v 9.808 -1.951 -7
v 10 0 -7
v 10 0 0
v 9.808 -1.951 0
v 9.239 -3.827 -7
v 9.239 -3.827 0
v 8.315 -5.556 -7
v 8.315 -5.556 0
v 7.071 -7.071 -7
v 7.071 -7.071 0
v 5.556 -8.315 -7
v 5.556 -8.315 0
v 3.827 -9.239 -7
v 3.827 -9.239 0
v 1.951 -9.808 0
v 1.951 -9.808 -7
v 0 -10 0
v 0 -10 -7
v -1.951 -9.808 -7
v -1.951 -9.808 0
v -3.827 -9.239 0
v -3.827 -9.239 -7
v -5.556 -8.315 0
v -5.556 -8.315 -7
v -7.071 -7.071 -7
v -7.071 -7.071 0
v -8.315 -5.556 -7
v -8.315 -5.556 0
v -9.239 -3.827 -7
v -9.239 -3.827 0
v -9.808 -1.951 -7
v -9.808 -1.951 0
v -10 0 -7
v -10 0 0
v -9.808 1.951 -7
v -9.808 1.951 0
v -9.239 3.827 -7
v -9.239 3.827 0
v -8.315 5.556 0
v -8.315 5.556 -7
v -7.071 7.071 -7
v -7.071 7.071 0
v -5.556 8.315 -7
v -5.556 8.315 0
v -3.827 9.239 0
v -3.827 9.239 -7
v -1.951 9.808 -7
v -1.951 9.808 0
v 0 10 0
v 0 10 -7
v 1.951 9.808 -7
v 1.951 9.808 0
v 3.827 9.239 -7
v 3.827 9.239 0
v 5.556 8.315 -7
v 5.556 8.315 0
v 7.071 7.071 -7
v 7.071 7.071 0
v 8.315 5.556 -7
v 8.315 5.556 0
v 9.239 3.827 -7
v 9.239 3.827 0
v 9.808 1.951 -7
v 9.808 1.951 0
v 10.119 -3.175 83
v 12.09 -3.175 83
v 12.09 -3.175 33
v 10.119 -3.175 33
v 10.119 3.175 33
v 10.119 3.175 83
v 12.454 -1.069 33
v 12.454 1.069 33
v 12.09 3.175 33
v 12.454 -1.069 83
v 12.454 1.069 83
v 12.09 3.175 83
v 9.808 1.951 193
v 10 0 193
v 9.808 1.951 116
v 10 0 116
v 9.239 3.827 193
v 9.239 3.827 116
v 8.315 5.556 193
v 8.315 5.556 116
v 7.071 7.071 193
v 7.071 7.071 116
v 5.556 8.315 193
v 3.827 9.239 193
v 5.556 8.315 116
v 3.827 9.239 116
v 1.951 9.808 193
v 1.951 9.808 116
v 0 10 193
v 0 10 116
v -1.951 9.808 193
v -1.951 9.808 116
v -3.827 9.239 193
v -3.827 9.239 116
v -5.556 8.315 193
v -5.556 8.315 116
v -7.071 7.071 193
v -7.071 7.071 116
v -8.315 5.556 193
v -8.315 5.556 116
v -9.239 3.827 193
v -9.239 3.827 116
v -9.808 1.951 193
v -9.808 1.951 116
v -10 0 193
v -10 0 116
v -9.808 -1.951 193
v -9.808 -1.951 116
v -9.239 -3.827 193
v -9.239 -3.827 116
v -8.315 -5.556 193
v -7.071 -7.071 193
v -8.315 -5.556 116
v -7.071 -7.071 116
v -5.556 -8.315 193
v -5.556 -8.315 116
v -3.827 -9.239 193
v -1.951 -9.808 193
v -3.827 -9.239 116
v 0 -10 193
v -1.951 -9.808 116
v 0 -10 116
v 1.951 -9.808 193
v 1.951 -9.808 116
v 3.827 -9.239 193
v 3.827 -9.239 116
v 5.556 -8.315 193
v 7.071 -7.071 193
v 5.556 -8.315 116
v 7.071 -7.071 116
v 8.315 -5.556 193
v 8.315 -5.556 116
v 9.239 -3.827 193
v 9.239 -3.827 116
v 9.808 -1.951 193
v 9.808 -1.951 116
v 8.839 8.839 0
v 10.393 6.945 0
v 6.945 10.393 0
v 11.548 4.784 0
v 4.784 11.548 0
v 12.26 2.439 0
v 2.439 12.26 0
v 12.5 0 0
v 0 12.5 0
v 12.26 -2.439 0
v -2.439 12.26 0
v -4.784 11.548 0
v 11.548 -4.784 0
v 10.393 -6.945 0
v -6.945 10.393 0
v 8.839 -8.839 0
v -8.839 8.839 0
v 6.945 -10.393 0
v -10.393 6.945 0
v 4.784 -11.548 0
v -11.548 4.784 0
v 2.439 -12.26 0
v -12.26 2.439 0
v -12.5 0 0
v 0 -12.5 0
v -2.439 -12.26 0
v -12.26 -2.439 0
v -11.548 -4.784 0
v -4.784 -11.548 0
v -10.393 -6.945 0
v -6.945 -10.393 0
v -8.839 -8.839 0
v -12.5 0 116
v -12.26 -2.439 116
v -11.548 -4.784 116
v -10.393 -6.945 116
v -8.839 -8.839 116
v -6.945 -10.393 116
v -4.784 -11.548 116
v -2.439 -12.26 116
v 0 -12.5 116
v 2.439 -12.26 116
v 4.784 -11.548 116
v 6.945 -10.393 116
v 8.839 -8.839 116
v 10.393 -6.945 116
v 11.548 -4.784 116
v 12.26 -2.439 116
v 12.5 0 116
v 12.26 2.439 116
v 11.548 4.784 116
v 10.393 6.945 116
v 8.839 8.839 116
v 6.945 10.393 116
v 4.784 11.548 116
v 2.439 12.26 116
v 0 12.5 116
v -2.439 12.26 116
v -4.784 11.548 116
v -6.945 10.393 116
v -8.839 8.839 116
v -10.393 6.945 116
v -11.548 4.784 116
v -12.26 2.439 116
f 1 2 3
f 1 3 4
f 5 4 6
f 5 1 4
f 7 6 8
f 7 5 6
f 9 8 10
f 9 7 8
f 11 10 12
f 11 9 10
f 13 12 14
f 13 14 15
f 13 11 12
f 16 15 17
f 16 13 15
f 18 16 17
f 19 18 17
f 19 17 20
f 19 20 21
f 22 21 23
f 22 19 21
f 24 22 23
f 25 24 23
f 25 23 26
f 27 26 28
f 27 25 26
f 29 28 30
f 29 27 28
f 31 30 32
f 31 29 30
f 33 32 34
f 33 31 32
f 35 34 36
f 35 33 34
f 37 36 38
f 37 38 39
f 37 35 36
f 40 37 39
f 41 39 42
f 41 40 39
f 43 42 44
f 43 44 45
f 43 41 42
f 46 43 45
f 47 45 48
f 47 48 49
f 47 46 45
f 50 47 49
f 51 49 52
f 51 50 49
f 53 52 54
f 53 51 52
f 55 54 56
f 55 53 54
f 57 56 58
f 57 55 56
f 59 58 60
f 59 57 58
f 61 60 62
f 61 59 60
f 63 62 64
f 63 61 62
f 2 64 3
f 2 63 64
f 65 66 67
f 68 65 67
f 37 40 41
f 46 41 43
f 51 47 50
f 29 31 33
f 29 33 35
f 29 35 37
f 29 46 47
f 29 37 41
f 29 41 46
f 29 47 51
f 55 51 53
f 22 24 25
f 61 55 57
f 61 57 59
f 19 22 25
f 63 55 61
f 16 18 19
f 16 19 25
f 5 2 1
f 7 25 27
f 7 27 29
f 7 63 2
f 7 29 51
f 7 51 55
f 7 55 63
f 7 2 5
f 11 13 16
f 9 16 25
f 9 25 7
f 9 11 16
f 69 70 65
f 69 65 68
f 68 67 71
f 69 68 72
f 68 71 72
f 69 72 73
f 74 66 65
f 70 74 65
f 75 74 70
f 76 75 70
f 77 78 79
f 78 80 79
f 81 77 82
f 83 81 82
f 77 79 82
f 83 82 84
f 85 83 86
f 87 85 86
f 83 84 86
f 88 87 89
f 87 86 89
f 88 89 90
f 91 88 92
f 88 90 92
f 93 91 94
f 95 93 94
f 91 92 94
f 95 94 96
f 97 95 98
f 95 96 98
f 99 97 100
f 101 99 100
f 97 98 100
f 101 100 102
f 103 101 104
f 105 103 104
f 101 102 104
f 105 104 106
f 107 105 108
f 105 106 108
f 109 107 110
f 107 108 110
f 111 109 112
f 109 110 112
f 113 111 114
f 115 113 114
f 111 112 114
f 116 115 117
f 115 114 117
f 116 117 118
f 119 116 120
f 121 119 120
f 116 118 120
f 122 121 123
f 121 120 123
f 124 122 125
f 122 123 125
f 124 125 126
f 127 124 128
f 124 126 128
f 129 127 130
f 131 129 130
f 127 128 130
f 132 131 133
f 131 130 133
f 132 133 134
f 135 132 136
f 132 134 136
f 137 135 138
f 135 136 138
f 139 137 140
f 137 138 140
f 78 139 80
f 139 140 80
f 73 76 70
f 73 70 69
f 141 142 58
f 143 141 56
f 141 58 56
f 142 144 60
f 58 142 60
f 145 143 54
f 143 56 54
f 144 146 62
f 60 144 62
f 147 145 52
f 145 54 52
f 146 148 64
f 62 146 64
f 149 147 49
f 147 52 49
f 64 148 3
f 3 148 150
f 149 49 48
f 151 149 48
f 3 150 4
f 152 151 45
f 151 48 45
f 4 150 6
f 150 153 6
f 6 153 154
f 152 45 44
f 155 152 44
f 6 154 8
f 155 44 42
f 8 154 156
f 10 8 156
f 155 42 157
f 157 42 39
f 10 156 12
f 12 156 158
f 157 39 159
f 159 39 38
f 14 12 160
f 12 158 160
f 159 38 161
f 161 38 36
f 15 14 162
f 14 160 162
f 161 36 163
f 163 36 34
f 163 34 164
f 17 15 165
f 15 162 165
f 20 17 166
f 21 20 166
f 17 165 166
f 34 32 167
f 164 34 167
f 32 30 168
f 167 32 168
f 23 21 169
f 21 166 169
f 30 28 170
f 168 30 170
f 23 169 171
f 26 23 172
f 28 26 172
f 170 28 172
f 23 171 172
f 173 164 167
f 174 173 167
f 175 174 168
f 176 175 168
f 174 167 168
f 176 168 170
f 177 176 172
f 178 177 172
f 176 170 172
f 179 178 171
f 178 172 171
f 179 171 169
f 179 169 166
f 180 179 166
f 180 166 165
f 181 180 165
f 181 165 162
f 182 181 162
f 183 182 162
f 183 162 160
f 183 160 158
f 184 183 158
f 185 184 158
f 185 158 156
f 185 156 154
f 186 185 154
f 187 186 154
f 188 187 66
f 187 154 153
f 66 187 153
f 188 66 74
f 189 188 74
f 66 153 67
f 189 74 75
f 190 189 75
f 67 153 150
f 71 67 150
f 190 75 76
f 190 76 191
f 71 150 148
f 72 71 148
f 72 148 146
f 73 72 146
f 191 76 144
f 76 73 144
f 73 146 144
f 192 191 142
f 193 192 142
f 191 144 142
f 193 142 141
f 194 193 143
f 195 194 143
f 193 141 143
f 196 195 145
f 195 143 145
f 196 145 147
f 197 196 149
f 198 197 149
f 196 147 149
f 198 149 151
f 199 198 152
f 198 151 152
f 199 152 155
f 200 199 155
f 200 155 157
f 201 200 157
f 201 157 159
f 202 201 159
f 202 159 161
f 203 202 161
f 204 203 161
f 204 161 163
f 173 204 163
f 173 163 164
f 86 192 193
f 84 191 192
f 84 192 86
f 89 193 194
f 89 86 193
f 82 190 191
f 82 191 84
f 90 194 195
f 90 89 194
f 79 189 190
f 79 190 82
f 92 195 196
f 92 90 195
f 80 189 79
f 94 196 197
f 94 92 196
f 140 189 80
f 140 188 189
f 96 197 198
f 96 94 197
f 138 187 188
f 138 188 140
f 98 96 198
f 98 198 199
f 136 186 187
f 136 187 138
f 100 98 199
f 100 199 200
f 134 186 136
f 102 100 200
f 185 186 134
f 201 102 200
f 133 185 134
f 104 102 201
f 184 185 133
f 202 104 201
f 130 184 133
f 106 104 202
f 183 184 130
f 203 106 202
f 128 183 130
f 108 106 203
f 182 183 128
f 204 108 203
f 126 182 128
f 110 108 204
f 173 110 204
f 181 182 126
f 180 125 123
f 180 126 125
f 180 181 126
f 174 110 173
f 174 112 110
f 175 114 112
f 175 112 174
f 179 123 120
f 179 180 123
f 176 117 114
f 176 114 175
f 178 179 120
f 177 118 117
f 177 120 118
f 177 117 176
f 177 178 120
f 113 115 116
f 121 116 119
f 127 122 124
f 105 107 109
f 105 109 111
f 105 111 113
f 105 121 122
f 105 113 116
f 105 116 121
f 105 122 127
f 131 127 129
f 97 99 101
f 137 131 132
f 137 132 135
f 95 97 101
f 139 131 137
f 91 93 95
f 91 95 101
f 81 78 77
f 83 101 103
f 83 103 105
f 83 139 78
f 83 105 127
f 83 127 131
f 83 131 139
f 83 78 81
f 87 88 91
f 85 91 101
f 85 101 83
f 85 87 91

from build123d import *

# Parameters (mm, degrees)
SKETCH1_R           = 12.5
BOSS_EXTRUDE1_DEPTH = 116
SKETCH2_R           = 10
BOSS_EXTRUDE2_DEPTH = 7
BOSS_EXTRUDE3_START = 7
SKETCH3_R           = 10
BOSS_EXTRUDE3_DEPTH = 7
SKETCH4_W           = 50
SKETCH4_H           = 6.35
CUT_EXTRUDE1_DEPTH  = 2.38125
SKETCH6_R           = 10
BOSS_EXTRUDE4_DEPTH = 70


with BuildPart() as part:
    # Sketch1 → Boss-Extrude1 (new body)
    with BuildSketch(Plane.XY):
        with Locations(Location((0, 0, 0), (0, 0, 180))):
            Circle(SKETCH1_R)
    extrude(amount=BOSS_EXTRUDE1_DEPTH)

    # Sketch2 → Boss-Extrude2 (add)
    with BuildSketch(Plane.XY.offset(116)):
        Circle(SKETCH2_R)
    extrude(amount=BOSS_EXTRUDE2_DEPTH)

    # Sketch3 → Boss-Extrude3 (add)
    with BuildSketch(Plane(origin=(0, 0, 0), x_dir=(-1, 0, 0), z_dir=(0, 0, -1)).offset(BOSS_EXTRUDE3_START)):
        with Locations(Location((0, 0, 0), (0, 0, 180))):
            Circle(SKETCH3_R)
    extrude(amount=-BOSS_EXTRUDE3_DEPTH)

    # Sketch4 → Cut-Extrude1 (cut)
    with BuildSketch(Plane(origin=(12.5, 0, 0), x_dir=(0, 0, -1), z_dir=(1, 0, 0))):
        with Locations((-58, 0)):
            Rectangle(SKETCH4_W, SKETCH4_H)
    extrude(amount=-CUT_EXTRUDE1_DEPTH, mode=Mode.SUBTRACT)

    # Sketch6 → Boss-Extrude4 (add)
    with BuildSketch(Plane.XY.offset(123)):
        Circle(SKETCH6_R)
    extrude(amount=BOSS_EXTRUDE4_DEPTH)


solid = part.part
